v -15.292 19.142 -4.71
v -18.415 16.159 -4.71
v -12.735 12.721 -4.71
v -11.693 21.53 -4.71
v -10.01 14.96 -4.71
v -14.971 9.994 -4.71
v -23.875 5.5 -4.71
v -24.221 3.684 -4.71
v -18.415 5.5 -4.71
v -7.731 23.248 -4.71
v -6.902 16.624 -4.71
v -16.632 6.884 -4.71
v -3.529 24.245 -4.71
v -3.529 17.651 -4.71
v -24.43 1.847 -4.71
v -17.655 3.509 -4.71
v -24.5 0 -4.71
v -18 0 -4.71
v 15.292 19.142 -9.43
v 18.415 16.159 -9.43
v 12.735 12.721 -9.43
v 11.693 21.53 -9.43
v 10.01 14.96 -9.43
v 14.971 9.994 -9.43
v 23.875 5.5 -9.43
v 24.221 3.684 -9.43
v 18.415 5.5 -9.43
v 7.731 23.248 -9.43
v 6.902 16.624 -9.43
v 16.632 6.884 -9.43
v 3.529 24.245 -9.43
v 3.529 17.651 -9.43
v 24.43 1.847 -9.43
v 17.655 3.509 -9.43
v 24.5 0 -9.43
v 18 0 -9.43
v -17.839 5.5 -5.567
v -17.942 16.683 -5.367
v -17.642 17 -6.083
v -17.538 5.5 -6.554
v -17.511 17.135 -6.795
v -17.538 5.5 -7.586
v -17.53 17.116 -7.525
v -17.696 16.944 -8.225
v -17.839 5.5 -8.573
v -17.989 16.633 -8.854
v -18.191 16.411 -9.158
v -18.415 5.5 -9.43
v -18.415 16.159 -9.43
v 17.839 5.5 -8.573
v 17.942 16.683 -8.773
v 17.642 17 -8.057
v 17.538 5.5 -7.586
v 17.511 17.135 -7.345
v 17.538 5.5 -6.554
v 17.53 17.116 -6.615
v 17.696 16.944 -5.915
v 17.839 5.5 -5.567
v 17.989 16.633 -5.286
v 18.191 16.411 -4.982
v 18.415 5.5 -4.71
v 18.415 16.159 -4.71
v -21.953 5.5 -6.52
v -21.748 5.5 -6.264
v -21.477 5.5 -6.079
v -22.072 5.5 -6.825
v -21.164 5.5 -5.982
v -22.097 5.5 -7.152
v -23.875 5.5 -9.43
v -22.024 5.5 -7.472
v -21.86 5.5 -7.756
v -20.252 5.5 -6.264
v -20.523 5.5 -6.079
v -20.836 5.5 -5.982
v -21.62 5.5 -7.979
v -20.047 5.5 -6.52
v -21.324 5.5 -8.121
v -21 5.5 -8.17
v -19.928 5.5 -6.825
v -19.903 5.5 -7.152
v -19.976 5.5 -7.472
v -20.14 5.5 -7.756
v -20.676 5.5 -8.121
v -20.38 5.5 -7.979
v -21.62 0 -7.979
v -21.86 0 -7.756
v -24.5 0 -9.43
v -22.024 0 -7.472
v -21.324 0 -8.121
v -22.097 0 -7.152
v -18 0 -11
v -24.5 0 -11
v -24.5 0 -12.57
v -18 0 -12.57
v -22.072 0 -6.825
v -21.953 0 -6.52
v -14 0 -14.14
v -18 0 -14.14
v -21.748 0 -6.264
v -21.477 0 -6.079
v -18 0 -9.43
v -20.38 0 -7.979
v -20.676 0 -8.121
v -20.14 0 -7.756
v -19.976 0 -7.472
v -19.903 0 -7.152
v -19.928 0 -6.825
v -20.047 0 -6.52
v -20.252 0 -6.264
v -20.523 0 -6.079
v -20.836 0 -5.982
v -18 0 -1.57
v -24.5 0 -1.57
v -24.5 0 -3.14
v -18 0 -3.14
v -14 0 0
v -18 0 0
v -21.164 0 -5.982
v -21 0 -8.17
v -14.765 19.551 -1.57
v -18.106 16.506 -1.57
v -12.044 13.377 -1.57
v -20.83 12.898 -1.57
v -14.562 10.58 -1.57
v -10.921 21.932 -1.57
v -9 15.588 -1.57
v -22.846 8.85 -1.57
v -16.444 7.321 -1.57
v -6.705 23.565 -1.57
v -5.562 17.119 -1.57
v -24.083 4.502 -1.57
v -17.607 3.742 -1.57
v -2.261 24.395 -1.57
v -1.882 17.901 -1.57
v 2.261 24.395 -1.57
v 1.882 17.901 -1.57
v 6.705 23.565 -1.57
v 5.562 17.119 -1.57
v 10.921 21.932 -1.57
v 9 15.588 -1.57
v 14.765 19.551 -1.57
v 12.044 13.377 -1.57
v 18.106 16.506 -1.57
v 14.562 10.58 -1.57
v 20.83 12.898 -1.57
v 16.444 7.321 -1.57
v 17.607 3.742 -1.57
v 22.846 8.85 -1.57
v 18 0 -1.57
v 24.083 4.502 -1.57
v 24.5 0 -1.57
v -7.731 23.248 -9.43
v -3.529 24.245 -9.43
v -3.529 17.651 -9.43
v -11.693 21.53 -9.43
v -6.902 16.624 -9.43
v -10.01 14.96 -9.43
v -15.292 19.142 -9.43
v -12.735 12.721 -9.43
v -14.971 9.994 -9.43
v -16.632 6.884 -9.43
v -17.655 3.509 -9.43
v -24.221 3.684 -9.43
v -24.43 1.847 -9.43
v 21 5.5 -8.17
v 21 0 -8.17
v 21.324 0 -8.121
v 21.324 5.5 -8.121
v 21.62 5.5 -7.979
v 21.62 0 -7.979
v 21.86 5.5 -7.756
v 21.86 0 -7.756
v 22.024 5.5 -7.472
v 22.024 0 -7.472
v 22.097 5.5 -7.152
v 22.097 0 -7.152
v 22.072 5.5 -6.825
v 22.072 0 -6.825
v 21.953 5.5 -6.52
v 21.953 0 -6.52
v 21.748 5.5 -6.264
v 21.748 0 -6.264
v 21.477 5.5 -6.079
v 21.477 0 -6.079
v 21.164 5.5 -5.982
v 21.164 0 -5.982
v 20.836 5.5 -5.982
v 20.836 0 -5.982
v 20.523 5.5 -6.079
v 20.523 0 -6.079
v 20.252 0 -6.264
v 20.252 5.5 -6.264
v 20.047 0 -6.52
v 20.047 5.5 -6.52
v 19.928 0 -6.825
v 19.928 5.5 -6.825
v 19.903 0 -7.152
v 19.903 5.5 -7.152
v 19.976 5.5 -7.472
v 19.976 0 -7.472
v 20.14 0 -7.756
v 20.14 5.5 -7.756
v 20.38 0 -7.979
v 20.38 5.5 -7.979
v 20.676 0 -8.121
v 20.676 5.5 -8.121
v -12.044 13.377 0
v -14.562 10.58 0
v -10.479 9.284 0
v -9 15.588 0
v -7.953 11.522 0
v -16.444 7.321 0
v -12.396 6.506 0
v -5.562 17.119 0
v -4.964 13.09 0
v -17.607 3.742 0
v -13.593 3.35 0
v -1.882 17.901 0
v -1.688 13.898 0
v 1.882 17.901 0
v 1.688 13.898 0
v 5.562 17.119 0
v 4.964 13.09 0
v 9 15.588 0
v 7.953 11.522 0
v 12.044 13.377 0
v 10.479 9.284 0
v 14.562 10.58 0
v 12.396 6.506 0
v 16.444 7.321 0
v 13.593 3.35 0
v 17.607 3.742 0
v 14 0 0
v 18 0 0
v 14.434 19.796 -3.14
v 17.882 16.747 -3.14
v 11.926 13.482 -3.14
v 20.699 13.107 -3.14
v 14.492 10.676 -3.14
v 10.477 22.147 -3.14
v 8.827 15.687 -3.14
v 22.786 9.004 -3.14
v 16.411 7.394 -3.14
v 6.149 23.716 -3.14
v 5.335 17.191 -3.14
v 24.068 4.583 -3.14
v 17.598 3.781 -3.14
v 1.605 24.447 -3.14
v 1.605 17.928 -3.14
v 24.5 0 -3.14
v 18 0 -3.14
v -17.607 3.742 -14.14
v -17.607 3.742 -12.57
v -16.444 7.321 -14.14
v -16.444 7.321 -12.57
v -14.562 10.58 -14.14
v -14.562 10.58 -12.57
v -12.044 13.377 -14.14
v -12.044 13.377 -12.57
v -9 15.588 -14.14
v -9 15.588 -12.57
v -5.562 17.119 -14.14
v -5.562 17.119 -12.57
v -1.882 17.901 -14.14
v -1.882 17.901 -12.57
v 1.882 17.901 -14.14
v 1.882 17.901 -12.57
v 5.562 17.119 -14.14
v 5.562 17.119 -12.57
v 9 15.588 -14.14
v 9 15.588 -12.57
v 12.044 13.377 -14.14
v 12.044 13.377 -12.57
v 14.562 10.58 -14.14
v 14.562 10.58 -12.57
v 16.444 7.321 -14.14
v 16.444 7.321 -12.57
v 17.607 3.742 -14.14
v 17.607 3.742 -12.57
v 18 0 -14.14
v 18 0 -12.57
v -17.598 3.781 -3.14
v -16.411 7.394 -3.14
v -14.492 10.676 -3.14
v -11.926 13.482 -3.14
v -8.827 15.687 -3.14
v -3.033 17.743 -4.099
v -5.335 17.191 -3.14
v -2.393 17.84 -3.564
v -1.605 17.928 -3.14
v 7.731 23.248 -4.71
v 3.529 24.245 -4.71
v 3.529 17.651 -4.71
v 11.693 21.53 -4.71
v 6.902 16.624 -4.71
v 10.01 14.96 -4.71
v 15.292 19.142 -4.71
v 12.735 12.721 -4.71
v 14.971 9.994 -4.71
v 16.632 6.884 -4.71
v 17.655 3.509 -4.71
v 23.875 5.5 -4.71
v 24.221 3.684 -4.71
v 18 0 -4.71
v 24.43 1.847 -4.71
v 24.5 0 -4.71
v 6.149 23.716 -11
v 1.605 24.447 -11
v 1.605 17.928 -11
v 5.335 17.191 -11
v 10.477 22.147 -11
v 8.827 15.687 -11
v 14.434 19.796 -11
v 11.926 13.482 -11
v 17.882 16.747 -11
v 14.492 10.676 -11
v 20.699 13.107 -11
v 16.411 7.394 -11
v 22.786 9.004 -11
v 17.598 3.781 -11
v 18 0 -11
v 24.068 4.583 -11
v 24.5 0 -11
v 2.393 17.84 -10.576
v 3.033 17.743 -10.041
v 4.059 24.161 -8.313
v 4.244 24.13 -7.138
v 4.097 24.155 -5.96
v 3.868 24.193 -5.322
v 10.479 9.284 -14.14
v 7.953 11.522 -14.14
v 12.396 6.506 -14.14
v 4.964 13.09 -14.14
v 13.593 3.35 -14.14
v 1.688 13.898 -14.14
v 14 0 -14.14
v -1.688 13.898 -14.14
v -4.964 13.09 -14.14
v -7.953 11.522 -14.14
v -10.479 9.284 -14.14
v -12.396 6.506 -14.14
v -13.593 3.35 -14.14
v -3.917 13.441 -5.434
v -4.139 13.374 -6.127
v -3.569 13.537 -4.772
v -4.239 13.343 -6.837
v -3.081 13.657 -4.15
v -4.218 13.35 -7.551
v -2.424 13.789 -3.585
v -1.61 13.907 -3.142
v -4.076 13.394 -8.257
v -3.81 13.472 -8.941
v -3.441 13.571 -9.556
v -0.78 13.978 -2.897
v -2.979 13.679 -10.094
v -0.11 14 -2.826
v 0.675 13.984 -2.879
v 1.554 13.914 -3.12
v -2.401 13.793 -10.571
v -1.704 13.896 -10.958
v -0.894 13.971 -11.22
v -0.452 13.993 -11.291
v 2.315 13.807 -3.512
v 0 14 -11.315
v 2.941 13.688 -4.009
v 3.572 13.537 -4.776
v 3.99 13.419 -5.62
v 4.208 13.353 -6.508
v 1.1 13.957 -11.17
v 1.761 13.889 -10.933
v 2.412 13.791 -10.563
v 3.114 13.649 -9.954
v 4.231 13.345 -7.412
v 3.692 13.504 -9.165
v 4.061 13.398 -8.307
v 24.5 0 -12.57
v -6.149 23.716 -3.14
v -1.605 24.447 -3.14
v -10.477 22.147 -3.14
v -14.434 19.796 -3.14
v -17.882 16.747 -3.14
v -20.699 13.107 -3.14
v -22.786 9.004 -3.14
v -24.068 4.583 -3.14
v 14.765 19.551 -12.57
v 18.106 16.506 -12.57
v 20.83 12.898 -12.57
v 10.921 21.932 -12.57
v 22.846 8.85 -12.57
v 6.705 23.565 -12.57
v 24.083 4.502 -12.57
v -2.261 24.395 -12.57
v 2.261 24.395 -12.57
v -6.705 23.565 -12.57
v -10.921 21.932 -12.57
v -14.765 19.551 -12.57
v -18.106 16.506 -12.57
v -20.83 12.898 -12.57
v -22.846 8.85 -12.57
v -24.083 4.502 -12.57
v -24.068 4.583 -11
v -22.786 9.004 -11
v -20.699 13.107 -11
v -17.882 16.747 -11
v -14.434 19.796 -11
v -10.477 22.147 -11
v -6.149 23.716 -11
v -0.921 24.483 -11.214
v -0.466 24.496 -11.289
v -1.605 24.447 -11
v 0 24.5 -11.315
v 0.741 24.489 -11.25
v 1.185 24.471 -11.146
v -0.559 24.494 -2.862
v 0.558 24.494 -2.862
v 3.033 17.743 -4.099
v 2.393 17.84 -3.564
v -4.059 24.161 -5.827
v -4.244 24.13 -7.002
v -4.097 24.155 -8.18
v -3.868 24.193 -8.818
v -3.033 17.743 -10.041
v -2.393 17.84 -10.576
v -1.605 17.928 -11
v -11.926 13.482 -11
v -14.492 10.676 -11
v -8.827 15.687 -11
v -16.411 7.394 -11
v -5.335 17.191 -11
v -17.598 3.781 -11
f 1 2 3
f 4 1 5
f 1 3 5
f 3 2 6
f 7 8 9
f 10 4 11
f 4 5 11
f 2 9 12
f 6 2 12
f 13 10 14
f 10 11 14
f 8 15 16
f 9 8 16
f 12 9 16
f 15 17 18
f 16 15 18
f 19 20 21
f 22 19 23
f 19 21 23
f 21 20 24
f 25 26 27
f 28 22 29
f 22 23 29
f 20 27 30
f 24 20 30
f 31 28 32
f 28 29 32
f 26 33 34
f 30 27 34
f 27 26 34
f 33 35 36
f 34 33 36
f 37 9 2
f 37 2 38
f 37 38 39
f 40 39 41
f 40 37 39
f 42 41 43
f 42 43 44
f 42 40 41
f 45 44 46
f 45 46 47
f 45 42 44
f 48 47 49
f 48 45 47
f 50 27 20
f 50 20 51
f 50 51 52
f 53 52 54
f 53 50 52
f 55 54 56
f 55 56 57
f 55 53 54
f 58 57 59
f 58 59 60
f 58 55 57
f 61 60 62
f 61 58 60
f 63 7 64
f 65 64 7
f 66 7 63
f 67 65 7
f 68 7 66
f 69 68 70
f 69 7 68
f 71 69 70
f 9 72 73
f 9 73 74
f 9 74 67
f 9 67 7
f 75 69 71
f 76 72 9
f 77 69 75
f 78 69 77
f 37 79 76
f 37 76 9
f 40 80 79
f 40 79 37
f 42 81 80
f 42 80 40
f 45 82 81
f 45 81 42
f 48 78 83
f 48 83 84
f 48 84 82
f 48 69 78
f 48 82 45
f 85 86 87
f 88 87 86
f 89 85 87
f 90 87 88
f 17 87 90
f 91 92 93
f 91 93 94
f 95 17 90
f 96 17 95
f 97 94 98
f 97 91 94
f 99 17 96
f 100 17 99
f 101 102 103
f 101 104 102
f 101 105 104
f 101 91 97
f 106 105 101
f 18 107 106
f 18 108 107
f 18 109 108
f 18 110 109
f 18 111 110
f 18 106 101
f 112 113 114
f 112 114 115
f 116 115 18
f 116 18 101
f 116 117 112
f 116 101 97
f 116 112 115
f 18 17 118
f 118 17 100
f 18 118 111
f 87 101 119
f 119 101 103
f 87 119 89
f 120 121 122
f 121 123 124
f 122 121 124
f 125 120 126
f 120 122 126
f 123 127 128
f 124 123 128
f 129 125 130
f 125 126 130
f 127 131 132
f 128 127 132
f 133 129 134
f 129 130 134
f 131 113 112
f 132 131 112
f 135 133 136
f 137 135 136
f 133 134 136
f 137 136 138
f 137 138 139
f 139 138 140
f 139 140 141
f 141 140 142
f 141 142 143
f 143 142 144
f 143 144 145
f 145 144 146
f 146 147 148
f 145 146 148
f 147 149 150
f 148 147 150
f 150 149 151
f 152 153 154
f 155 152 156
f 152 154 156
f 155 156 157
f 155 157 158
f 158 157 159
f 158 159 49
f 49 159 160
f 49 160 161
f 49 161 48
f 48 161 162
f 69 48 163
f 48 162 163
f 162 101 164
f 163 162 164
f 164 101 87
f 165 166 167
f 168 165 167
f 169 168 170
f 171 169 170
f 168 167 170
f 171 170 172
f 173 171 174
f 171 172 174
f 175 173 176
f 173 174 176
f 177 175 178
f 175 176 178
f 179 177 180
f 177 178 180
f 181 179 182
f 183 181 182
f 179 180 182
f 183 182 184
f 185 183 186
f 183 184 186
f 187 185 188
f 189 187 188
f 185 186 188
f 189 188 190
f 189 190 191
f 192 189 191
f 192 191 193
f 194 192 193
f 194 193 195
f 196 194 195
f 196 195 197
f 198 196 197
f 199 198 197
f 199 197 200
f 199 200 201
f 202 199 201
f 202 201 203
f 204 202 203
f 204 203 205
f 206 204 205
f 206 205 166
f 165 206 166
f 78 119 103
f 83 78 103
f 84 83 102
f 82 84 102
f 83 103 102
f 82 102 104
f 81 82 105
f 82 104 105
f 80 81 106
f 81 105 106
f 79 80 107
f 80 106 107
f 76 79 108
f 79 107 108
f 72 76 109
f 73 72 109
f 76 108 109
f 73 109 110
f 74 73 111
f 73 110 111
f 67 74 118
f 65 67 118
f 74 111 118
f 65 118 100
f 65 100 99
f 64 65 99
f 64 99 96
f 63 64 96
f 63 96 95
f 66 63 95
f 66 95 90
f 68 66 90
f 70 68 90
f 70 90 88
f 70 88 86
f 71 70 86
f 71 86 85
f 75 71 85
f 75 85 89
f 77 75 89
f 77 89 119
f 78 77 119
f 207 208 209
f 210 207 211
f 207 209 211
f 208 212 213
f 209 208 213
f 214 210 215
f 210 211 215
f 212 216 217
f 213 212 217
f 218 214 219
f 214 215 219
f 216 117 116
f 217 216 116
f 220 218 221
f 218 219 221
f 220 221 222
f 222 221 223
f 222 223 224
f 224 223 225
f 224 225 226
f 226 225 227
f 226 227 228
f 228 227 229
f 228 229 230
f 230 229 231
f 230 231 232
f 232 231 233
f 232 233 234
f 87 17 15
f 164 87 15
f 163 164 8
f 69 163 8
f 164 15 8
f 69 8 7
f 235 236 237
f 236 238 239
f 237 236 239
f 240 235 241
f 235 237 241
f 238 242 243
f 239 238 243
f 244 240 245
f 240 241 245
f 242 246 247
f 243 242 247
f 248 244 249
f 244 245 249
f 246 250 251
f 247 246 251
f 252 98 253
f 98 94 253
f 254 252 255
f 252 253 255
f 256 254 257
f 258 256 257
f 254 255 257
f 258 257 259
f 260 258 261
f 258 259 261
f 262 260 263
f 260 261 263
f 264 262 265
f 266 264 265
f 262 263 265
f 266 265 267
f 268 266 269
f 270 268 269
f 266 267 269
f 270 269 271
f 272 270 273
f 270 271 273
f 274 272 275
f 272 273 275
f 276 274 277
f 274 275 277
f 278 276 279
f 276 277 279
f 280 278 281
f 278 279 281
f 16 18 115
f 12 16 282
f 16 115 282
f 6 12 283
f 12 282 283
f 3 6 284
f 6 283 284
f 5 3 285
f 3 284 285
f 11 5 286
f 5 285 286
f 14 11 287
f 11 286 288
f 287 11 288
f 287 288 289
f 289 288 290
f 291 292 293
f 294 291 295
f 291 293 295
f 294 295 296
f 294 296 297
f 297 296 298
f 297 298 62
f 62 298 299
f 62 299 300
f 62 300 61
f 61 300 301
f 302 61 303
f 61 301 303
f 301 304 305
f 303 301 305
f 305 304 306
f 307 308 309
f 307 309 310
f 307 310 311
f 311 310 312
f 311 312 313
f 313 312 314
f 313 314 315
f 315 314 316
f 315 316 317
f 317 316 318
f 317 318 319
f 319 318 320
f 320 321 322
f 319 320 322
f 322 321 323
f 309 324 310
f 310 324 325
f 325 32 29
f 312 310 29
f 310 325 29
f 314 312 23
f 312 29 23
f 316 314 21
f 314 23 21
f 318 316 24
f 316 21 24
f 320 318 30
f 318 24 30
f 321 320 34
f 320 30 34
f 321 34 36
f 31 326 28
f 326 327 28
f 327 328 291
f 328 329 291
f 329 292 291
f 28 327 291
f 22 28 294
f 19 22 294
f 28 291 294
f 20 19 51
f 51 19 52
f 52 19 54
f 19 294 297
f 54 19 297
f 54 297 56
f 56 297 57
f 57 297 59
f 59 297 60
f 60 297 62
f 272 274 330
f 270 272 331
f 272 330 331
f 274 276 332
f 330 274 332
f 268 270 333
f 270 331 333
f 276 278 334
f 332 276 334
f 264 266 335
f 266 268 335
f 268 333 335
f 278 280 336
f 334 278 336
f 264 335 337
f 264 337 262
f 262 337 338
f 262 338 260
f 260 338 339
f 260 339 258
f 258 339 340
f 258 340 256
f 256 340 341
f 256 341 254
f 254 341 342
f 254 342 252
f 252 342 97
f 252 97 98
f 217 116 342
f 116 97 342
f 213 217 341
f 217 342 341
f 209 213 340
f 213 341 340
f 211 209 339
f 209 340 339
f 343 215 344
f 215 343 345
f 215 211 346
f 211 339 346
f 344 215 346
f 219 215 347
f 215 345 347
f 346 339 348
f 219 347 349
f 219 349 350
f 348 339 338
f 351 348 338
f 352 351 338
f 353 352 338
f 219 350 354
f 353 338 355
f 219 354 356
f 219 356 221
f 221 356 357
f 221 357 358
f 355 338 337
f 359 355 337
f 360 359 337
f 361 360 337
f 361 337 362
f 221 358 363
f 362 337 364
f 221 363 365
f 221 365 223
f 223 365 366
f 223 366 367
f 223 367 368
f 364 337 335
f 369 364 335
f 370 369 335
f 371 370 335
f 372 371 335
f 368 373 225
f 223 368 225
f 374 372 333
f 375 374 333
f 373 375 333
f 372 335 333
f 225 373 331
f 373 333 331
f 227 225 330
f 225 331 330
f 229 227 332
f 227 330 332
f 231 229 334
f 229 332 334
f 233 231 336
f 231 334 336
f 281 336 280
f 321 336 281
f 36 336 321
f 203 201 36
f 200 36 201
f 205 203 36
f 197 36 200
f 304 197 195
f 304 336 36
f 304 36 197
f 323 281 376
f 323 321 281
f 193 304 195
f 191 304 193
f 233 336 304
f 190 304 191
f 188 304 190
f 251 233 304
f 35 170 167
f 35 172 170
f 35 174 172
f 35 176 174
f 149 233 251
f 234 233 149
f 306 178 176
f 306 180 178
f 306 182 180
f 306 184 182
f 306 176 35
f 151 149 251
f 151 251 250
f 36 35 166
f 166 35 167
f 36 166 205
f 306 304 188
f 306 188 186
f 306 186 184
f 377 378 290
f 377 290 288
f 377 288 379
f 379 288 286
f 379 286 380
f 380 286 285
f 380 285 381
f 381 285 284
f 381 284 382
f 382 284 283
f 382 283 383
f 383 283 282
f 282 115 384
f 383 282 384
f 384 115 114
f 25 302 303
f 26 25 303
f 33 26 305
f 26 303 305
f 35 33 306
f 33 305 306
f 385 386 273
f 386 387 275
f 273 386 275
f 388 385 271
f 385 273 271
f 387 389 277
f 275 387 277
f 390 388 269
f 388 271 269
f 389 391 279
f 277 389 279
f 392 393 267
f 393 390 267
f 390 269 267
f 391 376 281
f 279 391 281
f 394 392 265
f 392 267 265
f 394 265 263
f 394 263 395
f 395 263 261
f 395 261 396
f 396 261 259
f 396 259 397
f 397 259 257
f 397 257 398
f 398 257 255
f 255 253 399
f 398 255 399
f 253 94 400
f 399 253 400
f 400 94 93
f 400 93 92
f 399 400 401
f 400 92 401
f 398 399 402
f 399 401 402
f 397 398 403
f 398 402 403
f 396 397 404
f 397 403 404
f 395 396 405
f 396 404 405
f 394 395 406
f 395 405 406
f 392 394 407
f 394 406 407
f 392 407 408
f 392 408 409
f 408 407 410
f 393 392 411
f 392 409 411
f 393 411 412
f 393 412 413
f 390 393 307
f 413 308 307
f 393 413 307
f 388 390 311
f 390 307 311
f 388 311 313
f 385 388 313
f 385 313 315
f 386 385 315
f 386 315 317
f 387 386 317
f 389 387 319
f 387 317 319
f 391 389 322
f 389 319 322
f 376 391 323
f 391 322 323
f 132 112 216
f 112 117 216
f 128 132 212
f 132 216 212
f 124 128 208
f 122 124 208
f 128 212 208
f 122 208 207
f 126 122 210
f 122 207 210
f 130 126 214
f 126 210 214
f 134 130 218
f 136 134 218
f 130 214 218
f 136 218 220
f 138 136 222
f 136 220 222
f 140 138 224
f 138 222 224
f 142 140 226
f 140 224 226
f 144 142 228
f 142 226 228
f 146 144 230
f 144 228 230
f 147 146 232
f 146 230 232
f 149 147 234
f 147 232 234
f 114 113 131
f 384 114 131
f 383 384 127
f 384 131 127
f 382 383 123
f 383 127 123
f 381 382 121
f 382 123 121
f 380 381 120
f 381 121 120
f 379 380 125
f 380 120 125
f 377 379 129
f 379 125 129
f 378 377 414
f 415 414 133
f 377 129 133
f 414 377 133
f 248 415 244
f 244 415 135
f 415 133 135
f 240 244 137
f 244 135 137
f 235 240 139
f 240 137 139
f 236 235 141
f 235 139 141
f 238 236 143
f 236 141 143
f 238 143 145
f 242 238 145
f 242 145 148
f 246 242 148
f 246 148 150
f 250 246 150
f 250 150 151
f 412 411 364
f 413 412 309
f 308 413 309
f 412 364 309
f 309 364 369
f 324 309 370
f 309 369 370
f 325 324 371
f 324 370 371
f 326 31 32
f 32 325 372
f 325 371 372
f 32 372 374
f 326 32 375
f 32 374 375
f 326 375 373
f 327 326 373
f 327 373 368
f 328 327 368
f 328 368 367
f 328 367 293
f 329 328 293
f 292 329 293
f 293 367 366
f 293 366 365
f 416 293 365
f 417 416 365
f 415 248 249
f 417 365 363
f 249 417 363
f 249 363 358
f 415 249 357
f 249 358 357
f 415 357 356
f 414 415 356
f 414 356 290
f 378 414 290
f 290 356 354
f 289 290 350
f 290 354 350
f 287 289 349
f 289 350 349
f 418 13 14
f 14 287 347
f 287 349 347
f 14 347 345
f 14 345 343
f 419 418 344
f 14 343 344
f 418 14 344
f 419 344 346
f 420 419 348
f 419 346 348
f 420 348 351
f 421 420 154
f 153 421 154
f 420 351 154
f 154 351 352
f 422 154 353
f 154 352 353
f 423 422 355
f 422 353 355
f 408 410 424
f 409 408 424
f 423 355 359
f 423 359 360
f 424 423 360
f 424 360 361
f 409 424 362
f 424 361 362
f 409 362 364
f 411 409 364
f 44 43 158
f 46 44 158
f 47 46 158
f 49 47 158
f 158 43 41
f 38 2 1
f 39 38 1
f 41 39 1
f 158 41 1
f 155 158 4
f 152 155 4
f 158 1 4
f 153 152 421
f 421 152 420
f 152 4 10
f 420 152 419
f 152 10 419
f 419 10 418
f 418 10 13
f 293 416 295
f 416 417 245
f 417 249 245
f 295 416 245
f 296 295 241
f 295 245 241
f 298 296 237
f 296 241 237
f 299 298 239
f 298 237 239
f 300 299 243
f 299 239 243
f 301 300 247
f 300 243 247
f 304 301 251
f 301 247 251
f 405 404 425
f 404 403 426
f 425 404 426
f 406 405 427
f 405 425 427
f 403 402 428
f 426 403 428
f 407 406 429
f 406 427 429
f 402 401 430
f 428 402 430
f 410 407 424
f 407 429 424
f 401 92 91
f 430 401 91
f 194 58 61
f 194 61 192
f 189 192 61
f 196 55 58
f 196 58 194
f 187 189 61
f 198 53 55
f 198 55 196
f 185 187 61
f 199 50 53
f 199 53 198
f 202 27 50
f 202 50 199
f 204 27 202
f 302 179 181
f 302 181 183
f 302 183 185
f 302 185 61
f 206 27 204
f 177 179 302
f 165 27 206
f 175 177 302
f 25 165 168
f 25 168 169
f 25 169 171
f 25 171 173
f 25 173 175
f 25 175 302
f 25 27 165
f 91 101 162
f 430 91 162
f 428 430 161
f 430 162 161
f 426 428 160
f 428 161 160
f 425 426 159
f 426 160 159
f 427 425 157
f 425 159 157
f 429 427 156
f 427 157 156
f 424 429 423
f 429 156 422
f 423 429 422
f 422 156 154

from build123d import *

# Parameters (mm, degrees)
CUT_EXTRUDE1_DEPTH = 38.422447809
CUT_EXTRUDE2_START = 5.5
CUT_EXTRUDE2_DEPTH = 32.922447809
SKETCH4_R          = 1.1
SKETCH4_R_2        = 4.245
CUT_EXTRUDE3_DEPTH = 38.422447874


with BuildPart() as part:
    # Sketch1 → Revolve1 (revolve)
    with BuildSketch(Plane(origin=(0, 0, 0), x_dir=(1, 0, 0), z_dir=(0, 1, 0)), mode=Mode.PRIVATE) as revolve1_sk:
        Polygon((-14, 0), (-14, 14.14), (-18, 14.14), (-18, 12.57), (-24.5, 12.57), (-24.5, 11), (-18, 11), (-18, 9.43), (-24.5, 9.43), (-24.5, 4.71), (-18, 4.71), (-18, 3.14), (-24.5, 3.14), (-24.5, 1.57), (-18, 1.57), (-18, 0), align=None)
    revolve(revolve1_sk.sketch.rotate(Axis((0, 0, 0), (0, 0, -1)), 180), axis=Axis((0, 0, 0), (0, 0, -1)))

    # Sketch2 → Cut-Extrude1 (cut, through all)
    with BuildSketch(Plane.XY):
        with BuildLine():
            Line((-24.5, 0), (24.5, 0))
            ThreePointArc((24.5, 0), (0, -24.5), (-24.5, 0))
        make_face()
    extrude(amount=-CUT_EXTRUDE1_DEPTH, mode=Mode.SUBTRACT)

    # Sketch3 → Cut-Extrude2 (cut, through all)
    with BuildSketch(Plane(origin=(0, 0, 0), x_dir=(1, 0, 0), z_dir=(0, 1, 0)).offset(CUT_EXTRUDE2_START)):
        with BuildLine():
            Line((-23.584646978, 9.43), (-24.5, 9.43))
            Line((-24.5, 9.43), (-24.5, 4.71))
            Line((-24.5, 4.71), (-23.584646978, 4.71))
            ThreePointArc((-23.584646978, 4.71), (-17.5, 7.07), (-23.584646978, 9.43))
        make_face()
        with BuildLine():
            Line((23.584646978, 4.71), (24.5, 4.71))
            Line((24.5, 4.71), (24.5, 9.43))
            Line((24.5, 9.43), (23.584646978, 9.43))
            ThreePointArc((23.584646978, 9.43), (17.5, 7.07), (23.584646978, 4.71))
        make_face()
    extrude(amount=CUT_EXTRUDE2_DEPTH, mode=Mode.SUBTRACT)

    # Sketch4 → Cut-Extrude3 (cut, through all)
    with BuildSketch(Plane.XZ):
        with Locations(Location((-21, -7.07, 0), (0, 0, 270))):
            Circle(SKETCH4_R)
        with Locations(Location((21, -7.07, 0), (0, 0, 270))):
            Circle(SKETCH4_R)
        with Locations(Location((0, -7.07, 0), (0, 0, 270))):
            Circle(SKETCH4_R_2)
    extrude(amount=-CUT_EXTRUDE3_DEPTH, mode=Mode.SUBTRACT)


solid = part.part
